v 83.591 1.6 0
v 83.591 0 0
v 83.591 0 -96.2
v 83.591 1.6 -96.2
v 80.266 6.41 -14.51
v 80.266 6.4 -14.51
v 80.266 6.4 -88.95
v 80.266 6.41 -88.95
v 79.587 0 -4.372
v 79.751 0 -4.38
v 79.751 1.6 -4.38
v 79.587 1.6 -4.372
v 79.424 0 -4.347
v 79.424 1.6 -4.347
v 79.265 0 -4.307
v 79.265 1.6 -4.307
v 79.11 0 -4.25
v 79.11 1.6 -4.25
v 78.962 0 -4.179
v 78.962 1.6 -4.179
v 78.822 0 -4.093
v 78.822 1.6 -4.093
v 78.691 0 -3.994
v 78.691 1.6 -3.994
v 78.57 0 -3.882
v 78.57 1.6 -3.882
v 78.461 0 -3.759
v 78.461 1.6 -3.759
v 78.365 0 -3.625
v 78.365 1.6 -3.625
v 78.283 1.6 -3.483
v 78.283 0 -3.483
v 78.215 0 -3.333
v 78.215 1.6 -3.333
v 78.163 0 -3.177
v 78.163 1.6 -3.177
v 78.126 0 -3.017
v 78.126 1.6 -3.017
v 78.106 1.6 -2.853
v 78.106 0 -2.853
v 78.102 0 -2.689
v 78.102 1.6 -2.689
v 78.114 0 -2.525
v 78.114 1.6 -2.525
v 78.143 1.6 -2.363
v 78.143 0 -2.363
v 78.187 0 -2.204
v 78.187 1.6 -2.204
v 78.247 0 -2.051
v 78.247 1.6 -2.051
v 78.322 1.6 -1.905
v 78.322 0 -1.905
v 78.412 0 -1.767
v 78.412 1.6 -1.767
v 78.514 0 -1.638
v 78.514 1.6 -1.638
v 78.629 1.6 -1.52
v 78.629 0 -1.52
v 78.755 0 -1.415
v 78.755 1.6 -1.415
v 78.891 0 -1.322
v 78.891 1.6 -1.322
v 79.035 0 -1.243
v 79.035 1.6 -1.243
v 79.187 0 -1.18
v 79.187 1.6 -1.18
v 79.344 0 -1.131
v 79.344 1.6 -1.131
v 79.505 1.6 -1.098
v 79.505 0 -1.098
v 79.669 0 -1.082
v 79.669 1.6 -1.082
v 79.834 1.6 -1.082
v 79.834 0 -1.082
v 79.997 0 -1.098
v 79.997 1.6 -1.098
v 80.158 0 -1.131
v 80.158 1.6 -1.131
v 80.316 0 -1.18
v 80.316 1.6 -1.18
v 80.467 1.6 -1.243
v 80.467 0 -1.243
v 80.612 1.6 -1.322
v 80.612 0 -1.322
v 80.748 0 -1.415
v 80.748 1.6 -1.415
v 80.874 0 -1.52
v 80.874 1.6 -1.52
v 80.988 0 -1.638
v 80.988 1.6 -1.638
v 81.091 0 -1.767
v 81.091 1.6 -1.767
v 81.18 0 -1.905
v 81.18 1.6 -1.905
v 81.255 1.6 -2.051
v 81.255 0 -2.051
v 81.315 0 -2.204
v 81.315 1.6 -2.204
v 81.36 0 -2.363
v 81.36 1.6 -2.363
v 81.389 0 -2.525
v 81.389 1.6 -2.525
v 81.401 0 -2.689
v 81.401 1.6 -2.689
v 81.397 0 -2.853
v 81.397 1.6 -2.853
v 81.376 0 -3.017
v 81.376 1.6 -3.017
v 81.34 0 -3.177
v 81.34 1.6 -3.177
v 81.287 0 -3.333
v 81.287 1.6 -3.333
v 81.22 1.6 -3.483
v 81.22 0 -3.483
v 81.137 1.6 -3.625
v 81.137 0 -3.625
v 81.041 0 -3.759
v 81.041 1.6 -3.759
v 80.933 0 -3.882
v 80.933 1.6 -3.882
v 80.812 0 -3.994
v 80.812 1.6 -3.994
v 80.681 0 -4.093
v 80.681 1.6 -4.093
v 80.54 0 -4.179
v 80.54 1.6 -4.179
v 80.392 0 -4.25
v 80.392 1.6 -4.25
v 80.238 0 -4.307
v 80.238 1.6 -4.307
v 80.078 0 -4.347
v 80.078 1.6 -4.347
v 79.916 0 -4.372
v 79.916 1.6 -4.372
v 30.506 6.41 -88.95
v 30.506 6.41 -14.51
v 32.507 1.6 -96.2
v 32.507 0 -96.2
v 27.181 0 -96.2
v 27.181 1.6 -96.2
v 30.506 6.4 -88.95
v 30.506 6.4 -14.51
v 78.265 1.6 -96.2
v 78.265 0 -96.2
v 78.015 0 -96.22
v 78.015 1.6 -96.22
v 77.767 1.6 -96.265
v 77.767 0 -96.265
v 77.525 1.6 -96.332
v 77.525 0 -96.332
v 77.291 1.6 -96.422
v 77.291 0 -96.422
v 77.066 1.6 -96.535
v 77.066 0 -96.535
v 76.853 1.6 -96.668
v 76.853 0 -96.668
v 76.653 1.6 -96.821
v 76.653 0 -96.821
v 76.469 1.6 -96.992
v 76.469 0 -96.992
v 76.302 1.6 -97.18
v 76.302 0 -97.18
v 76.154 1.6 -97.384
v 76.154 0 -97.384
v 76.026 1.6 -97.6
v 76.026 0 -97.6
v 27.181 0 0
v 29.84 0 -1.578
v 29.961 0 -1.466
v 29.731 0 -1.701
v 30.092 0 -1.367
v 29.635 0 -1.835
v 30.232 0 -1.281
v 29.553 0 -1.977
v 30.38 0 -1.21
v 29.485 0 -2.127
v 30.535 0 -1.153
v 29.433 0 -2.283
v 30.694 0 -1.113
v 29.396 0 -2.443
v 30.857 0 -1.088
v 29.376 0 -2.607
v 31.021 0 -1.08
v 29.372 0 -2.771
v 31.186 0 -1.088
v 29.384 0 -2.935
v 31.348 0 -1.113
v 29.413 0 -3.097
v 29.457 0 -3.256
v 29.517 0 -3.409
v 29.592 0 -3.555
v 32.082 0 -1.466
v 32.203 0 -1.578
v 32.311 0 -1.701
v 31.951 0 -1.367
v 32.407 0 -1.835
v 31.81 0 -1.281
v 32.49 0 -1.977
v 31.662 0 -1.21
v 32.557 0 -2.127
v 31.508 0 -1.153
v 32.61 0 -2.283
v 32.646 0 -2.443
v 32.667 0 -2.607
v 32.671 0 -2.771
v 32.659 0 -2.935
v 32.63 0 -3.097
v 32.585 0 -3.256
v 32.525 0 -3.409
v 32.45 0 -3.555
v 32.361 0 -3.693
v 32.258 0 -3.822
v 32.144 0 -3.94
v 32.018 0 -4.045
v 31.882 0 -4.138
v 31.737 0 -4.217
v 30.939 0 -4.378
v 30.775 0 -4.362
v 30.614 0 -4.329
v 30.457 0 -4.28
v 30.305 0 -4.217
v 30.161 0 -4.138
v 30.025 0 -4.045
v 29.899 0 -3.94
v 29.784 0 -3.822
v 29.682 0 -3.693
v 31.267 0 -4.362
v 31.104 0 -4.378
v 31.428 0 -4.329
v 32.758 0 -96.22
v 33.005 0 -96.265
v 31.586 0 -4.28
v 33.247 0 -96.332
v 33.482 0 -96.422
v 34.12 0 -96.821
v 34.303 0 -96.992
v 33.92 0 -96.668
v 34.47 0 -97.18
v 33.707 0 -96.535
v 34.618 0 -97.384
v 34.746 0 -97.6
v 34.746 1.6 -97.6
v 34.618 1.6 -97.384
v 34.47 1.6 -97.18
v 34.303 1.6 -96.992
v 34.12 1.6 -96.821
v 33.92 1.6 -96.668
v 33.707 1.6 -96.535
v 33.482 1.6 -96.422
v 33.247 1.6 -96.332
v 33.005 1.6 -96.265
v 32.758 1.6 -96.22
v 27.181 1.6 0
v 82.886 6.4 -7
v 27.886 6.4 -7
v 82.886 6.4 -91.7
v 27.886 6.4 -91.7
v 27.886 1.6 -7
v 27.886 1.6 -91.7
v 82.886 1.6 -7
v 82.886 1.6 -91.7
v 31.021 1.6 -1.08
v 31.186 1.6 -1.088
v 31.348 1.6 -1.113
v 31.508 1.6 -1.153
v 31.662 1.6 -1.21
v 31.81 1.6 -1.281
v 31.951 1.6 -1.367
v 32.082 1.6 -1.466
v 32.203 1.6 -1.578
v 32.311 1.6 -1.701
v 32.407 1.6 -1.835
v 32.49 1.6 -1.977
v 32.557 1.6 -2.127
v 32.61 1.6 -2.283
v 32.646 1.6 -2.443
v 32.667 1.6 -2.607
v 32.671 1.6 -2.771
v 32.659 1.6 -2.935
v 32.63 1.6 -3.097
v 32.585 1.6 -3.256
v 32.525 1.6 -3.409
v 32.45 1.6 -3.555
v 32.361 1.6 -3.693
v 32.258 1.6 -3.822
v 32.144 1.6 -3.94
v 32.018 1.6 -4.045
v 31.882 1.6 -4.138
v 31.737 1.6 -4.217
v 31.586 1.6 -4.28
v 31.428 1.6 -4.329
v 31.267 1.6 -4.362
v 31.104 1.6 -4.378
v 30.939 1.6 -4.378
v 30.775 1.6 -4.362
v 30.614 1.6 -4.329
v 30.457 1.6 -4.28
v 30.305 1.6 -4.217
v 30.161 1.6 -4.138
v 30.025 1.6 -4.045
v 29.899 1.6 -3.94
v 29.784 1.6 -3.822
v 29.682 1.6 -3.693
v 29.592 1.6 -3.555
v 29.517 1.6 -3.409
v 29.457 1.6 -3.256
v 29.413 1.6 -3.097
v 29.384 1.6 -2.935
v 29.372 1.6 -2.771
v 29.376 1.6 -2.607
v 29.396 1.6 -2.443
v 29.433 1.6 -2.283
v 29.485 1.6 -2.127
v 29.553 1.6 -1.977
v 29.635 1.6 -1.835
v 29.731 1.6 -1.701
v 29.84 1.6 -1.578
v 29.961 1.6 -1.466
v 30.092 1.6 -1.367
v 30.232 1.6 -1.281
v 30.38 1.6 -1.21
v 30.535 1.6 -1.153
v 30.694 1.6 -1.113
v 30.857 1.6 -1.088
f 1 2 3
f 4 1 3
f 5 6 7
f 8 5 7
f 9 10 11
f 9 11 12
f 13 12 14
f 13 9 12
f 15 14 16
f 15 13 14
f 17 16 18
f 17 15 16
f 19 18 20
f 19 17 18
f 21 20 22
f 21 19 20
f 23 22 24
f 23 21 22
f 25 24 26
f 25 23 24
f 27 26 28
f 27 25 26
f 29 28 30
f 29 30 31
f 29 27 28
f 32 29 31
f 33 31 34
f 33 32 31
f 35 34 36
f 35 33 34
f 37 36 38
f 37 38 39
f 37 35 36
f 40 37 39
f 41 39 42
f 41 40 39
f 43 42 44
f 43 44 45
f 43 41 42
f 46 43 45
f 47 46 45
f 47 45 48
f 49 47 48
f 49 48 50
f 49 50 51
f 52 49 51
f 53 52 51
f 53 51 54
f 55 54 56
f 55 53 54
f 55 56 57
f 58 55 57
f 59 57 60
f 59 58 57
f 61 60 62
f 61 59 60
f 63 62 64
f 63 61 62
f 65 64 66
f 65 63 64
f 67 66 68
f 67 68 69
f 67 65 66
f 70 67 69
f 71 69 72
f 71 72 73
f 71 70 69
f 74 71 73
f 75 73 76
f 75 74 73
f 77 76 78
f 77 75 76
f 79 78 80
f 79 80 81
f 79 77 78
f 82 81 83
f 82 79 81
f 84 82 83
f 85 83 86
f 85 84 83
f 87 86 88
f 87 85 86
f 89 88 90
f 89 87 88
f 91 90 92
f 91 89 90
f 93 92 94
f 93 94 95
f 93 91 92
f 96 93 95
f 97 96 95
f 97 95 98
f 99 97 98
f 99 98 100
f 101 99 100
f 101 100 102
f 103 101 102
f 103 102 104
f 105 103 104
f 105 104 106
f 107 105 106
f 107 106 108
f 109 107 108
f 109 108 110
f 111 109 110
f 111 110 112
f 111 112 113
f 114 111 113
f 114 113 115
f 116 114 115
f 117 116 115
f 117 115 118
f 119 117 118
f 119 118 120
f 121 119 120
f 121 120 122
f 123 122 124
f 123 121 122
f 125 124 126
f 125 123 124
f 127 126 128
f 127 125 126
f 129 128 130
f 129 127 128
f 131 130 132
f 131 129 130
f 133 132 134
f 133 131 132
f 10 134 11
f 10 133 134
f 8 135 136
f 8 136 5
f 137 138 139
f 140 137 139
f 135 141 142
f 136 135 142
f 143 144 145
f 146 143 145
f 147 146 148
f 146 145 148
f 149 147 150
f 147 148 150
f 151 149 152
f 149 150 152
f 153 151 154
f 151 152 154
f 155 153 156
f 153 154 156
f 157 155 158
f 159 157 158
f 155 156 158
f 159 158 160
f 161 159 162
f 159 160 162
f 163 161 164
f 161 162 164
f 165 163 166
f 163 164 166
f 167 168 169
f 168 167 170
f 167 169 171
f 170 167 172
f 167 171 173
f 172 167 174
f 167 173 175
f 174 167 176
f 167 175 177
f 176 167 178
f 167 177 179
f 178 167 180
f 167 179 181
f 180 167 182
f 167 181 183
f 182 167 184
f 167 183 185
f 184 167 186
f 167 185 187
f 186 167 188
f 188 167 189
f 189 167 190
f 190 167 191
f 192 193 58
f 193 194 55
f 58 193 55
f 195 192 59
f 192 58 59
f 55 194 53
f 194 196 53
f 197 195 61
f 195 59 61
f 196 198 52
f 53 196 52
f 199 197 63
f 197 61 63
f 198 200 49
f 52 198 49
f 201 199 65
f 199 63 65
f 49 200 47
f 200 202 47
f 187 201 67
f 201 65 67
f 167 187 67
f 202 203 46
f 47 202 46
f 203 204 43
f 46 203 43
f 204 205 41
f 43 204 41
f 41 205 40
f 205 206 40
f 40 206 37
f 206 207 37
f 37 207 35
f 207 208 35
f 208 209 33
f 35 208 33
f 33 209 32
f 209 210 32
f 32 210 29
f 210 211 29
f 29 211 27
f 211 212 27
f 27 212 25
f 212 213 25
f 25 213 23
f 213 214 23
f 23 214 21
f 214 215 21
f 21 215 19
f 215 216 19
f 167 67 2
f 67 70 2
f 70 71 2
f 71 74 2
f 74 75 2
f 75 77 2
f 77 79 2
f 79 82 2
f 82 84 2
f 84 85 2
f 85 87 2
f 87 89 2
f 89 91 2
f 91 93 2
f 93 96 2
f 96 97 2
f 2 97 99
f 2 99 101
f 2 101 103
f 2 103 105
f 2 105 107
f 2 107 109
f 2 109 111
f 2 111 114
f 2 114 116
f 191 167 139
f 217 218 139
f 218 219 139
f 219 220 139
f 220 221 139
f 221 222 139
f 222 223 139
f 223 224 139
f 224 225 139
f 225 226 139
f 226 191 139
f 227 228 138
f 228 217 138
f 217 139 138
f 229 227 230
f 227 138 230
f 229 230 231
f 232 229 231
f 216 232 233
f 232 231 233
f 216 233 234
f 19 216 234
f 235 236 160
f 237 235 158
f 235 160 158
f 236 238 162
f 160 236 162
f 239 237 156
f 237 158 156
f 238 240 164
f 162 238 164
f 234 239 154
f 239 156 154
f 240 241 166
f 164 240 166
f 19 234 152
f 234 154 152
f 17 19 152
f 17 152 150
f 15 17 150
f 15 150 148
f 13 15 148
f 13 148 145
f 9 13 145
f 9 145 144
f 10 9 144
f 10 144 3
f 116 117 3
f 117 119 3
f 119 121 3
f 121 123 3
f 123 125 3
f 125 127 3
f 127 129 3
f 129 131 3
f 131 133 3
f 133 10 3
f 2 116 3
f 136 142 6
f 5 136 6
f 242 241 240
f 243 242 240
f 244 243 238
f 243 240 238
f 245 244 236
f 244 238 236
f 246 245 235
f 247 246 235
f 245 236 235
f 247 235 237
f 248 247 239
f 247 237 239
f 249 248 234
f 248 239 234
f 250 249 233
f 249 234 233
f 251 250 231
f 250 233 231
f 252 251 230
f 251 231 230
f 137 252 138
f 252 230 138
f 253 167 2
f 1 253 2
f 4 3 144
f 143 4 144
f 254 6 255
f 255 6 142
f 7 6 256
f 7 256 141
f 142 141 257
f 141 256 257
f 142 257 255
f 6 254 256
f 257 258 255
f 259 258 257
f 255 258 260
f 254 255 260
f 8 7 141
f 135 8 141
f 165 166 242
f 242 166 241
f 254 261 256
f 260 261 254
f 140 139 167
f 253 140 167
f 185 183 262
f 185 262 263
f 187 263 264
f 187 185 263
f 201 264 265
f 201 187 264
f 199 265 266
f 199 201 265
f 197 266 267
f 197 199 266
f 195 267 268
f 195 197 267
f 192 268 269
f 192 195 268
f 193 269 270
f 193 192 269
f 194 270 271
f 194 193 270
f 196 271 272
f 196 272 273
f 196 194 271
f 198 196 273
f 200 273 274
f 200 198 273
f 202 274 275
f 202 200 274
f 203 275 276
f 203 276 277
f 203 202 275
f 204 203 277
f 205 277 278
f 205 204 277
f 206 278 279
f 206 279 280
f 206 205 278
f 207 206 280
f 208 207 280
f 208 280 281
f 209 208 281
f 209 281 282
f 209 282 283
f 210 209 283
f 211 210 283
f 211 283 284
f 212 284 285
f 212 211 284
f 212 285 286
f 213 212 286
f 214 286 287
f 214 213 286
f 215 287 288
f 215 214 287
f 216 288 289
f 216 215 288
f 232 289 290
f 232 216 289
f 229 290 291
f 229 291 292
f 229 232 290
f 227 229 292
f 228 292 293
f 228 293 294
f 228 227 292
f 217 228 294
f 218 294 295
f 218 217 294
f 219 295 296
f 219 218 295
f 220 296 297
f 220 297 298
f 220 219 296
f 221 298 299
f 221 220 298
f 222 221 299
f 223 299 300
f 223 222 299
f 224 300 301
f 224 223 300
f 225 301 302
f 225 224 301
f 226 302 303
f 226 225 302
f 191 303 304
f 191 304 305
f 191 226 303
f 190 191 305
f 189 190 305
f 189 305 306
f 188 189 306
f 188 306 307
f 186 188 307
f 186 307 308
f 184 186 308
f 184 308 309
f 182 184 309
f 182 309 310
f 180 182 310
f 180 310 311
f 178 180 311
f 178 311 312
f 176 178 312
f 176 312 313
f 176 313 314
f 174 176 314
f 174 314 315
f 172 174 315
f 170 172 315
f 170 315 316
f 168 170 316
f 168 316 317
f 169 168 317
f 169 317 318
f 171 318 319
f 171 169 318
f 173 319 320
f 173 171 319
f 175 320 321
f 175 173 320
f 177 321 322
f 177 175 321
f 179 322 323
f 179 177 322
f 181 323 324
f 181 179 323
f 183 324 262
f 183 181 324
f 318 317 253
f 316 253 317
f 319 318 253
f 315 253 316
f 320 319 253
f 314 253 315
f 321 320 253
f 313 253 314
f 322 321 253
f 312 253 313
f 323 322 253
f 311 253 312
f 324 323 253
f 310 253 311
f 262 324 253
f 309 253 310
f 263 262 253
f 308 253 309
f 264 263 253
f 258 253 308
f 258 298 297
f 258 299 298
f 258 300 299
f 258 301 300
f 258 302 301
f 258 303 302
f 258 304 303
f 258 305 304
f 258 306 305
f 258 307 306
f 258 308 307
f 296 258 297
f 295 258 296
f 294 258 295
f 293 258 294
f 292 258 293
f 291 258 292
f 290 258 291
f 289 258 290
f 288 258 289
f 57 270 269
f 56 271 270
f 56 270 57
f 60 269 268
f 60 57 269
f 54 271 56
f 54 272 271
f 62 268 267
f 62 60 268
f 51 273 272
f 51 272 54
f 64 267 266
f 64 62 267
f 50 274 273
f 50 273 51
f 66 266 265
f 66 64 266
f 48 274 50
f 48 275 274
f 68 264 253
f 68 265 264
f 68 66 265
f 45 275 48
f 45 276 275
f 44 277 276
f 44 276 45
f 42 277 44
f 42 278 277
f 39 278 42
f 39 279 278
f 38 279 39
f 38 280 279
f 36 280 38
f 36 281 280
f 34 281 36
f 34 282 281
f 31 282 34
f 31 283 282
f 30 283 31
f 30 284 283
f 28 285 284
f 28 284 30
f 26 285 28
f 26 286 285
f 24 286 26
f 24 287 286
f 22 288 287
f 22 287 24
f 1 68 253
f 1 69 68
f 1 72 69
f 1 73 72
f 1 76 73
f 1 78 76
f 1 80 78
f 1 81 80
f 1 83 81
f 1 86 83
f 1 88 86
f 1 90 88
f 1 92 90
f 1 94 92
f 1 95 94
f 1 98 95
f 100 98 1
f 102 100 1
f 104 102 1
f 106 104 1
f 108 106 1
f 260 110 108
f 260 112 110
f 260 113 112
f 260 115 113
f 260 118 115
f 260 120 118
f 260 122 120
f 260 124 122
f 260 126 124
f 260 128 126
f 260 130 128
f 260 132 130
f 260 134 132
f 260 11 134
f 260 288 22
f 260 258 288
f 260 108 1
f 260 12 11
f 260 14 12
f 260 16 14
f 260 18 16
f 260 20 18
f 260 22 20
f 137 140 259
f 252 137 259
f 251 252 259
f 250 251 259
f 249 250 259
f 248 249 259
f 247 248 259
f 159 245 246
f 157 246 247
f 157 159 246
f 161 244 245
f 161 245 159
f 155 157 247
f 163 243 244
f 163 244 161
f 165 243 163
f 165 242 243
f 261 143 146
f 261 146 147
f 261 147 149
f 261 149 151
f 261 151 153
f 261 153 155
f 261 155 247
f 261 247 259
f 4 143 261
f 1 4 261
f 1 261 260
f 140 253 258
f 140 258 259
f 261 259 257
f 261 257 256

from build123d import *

# Parameters (mm, degrees)
SKETCH_1_R      = 1.65
EXTRUDE_1_DEPTH = 1.6
EXTRUDE_2_DEPTH = 4.8
EXTRUDE_3_DEPTH = 0.01


with BuildPart() as part:
    # 草图1 → 凸台-拉伸1 (new body)
    with BuildSketch(Plane(origin=(0, 0, 0), x_dir=(1, 0, 0), z_dir=(0, 1, 0))):
        with BuildLine():
            Line((27.181335969, 0), (83.591335969, 0))
            Line((83.591335969, 0), (83.591335969, 96.2))
            Line((83.591335969, 96.2), (78.265479271, 96.2))
            ThreePointArc((78.265479271, 96.2), (76.9576214, 96.598857266), (76.026335969, 97.6))
            Line((76.026335969, 97.6), (55.386335969, 97.6))
            Line((55.386335969, 97.6), (34.746335969, 97.6))
            ThreePointArc((34.746335969, 97.6), (33.815050539, 96.598857266), (32.507192668, 96.2))
            Line((32.507192668, 96.2), (27.181335969, 96.2))
            Line((27.181335969, 96.2), (27.181335969, 0))
        make_face()
        with Locations(Location((31.021335969, 2.73, 0), (0, 0, 270))):
            Circle(SKETCH_1_R, mode=Mode.SUBTRACT)
        with Locations(Location((79.751335969, 2.73, 0), (0, 0, 90))):
            Circle(SKETCH_1_R, mode=Mode.SUBTRACT)
    extrude(amount=EXTRUDE_1_DEPTH)

    # 草图3 → 凸台-拉伸2 (add)
    with BuildSketch(Plane(origin=(0, 1.6, 0), x_dir=(1, 0, 0), z_dir=(0, 1, 0))):
        Polygon((55.386335969, 7), (27.886335969, 7), (27.886335969, 91.7), (82.886335969, 91.7), (82.886335969, 7), align=None)
    extrude(amount=EXTRUDE_2_DEPTH)

    # 草图4 → 凸台-拉伸3 (add)
    with BuildSketch(Plane(origin=(0, 6.4, 0), x_dir=(1, 0, 0), z_dir=(0, 1, 0))):
        Polygon((55.386335969, 88.95), (30.506335969, 88.95), (30.506335969, 14.51), (80.266335969, 14.51), (80.266335969, 88.95), align=None)
    extrude(amount=EXTRUDE_3_DEPTH)


solid = part.part
